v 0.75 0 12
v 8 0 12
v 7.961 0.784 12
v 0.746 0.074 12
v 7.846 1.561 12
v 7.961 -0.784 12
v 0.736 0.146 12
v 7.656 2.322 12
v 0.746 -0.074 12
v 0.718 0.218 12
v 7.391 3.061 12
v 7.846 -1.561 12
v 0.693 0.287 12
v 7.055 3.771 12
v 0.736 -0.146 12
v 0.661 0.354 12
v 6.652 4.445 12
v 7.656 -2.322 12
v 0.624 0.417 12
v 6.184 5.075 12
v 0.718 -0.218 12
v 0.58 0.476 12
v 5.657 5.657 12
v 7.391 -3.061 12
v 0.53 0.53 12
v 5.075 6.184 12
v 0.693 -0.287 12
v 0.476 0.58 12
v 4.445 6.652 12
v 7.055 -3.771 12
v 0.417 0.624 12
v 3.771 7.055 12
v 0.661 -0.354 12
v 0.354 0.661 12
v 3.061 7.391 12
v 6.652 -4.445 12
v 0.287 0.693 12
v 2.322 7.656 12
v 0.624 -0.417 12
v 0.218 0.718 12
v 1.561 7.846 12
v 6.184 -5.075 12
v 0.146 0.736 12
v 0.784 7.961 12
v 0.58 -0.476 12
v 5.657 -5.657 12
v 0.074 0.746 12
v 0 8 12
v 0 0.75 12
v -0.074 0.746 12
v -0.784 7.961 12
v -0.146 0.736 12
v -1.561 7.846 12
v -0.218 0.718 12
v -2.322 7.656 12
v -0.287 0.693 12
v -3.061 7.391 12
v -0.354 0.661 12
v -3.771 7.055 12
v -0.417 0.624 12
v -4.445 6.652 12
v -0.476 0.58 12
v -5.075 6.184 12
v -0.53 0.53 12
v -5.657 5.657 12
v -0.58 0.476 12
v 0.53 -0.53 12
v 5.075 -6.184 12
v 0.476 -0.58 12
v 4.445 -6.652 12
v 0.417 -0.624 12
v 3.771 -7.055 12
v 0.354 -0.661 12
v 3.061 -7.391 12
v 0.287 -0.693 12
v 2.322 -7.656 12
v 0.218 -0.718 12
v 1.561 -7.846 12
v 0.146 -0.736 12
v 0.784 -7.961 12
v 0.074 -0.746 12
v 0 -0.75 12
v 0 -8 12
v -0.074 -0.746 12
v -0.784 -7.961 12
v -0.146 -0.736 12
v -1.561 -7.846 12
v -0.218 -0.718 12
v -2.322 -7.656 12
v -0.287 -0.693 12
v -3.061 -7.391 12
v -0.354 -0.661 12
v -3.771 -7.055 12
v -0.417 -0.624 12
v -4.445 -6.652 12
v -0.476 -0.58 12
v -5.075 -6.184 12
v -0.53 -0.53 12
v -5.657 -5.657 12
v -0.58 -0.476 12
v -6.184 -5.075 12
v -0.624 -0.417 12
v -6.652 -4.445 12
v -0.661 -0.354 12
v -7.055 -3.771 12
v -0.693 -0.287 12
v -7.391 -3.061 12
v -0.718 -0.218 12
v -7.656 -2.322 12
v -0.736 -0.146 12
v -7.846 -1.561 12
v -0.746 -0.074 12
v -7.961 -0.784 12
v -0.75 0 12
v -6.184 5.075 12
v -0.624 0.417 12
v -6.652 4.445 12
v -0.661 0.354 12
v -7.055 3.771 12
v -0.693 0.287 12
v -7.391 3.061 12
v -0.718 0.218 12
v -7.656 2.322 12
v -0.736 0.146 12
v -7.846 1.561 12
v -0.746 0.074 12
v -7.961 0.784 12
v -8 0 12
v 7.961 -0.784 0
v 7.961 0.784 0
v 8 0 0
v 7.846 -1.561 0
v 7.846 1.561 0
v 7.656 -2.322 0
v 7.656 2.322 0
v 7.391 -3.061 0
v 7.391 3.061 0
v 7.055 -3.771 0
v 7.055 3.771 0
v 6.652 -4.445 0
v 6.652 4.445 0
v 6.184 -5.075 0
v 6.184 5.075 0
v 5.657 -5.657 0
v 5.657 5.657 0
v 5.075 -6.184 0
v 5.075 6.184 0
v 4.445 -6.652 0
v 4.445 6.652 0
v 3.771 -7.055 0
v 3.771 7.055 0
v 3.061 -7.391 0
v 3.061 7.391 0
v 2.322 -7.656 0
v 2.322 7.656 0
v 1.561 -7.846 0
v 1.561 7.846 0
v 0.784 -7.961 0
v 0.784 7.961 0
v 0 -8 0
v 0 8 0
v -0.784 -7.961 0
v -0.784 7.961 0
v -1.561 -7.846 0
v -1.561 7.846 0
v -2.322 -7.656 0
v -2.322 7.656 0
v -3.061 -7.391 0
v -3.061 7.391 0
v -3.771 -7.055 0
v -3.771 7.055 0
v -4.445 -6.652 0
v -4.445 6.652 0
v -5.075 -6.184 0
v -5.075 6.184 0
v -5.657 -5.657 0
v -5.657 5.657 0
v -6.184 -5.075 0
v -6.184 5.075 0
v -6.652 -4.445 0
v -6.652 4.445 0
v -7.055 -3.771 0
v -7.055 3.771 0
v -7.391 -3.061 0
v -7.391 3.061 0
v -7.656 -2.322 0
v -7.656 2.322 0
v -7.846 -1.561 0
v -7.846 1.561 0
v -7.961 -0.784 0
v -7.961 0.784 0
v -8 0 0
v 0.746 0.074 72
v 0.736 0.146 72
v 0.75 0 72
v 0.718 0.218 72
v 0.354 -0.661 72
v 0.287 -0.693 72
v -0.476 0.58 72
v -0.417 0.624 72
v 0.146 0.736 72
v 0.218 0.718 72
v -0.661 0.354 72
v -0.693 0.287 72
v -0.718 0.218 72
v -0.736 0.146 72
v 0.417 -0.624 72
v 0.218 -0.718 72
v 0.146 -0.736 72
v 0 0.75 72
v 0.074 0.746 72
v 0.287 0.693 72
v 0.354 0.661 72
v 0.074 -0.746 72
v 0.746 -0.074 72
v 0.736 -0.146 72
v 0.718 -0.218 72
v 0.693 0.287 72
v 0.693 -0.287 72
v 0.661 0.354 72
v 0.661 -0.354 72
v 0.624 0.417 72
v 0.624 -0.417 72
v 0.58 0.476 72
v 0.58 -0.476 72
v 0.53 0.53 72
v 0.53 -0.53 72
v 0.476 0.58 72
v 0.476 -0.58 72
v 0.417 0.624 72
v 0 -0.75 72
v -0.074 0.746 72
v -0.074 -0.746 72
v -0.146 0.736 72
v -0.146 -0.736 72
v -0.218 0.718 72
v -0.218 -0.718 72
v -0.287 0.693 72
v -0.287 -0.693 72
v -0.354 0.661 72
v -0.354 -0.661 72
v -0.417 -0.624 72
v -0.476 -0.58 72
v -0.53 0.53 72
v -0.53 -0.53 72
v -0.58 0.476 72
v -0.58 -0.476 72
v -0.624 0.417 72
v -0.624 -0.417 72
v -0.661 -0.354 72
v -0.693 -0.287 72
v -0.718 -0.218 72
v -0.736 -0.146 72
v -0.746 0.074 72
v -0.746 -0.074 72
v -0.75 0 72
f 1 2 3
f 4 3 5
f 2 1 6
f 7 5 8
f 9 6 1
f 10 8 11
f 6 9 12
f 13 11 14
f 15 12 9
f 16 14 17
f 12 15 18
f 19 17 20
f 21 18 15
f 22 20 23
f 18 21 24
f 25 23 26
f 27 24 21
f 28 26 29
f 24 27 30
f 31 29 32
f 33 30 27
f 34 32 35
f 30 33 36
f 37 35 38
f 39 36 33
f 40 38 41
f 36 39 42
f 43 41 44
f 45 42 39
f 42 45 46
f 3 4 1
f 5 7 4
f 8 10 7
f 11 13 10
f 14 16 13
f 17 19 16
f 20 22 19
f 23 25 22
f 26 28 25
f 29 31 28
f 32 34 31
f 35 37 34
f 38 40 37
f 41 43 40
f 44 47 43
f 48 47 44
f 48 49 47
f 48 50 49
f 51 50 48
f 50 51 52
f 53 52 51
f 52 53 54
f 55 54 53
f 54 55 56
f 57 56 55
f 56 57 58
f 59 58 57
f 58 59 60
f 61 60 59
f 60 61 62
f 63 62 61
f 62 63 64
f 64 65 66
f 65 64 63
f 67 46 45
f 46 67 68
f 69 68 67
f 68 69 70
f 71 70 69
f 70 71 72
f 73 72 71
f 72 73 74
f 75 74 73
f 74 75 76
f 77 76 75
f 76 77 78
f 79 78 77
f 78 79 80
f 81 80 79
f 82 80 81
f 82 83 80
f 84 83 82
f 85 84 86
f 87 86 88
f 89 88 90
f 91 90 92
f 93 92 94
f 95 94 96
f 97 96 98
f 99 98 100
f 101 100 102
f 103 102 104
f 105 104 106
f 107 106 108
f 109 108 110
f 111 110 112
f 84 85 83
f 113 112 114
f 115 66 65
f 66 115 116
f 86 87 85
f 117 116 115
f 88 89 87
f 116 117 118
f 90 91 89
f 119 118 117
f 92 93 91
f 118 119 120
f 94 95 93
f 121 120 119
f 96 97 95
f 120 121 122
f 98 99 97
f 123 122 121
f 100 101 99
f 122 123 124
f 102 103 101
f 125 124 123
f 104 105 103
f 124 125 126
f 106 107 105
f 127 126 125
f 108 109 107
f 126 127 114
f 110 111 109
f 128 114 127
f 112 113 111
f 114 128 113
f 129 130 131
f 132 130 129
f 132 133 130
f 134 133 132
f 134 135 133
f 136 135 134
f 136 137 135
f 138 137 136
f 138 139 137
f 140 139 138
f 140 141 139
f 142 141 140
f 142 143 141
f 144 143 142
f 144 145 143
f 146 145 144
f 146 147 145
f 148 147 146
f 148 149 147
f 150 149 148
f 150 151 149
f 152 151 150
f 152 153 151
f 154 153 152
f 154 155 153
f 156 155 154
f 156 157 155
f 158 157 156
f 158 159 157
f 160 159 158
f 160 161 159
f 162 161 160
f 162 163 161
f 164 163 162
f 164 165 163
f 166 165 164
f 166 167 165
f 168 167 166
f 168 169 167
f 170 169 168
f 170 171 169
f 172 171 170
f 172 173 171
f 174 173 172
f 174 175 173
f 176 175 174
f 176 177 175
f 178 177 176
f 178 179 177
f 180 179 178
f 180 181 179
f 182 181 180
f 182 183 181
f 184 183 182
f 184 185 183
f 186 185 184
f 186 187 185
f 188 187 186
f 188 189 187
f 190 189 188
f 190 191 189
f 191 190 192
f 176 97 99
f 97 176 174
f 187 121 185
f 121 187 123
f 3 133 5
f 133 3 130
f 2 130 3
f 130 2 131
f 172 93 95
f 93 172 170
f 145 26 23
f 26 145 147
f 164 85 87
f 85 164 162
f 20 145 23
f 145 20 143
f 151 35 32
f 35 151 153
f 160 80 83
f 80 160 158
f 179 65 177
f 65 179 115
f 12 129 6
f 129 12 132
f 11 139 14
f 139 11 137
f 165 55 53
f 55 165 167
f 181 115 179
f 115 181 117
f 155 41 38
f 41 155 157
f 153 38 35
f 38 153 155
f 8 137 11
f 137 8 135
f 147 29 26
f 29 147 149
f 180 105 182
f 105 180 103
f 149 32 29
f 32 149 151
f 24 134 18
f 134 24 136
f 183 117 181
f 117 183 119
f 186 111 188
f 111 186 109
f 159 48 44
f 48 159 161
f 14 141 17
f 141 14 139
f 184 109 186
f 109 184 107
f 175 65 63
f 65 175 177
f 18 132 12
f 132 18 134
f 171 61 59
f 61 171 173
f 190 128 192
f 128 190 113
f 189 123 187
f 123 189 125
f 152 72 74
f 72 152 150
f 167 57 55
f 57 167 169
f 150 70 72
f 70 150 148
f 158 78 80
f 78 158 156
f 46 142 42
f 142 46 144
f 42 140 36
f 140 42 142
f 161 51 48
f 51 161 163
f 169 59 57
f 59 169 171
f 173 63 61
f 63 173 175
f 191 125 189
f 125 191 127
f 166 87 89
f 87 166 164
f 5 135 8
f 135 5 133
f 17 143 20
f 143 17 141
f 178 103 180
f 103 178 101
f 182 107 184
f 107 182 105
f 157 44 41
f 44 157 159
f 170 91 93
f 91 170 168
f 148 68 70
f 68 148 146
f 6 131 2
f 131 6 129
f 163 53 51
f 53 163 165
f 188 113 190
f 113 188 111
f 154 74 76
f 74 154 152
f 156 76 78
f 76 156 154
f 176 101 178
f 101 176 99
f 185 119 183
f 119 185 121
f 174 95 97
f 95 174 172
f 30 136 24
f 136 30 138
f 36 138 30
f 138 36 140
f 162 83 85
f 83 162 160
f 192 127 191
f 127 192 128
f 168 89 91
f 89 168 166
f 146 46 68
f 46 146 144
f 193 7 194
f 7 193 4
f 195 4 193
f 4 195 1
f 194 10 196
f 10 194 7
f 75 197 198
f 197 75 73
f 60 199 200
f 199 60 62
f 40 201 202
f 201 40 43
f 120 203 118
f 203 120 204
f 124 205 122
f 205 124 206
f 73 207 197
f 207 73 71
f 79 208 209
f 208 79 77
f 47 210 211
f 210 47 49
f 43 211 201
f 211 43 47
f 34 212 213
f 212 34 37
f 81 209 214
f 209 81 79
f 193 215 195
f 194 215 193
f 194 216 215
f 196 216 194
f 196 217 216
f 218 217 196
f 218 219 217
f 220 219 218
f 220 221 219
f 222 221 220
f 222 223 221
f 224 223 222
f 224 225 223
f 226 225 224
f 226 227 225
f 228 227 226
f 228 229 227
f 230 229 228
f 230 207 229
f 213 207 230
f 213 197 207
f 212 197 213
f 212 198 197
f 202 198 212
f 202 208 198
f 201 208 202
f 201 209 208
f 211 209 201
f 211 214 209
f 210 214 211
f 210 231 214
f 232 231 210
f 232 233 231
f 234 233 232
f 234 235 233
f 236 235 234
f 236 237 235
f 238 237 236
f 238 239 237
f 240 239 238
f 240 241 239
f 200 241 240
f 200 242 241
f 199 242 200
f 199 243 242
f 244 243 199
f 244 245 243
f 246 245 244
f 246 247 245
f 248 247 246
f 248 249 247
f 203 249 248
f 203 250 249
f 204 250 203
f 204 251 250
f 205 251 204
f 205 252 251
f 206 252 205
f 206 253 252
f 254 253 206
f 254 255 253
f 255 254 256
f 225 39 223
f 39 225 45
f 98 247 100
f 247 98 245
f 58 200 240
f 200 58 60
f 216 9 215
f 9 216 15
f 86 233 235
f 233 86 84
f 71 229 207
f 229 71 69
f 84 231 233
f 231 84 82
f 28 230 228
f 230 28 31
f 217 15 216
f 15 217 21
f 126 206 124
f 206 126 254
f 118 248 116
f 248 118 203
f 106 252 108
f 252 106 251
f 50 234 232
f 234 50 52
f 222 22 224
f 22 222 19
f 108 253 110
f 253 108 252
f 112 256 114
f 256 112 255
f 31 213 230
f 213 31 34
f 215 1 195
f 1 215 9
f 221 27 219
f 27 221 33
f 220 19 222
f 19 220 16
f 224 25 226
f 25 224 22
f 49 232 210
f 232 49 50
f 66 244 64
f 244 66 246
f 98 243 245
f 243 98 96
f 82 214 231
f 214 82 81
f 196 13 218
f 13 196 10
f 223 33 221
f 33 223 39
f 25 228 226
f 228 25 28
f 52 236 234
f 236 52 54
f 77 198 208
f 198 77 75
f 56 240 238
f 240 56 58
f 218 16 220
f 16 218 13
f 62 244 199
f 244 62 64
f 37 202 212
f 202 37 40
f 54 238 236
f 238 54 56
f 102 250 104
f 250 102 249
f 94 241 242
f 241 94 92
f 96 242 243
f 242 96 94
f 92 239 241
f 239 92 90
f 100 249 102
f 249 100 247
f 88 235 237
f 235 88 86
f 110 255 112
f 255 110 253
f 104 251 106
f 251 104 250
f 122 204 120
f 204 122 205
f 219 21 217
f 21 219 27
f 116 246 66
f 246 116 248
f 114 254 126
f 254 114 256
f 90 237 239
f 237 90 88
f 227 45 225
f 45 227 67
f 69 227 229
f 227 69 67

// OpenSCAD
// Carpet / Material-Recognition Sensor — HTW HT-300PLTR1612-1-class 300 kHz
// ultrasonic transducer (OOMWOO BOM "Carpet sensor — Ultrasonic 300kHz")
// ===========================================================================
//
// Parametric clearance/interfacing model of the 300 kHz ultrasonic transducer
// used by OOMWOO as the carpet/material-recognition sensor.
//
// BOM identity (verify against the actual unit before relying on fit):
//   BOM.md row "Carpet sensor | 1 | $6-12 | Ultrasonic 300kHz | Low
//   availability retail ... purchase factory direct instead". The BOM does not
//   name a part number; the class of part is a ~300 kHz ultrasonic material /
//   carpet recognition transducer with a single enclosed transceiver element.
//
// Dimension basis — TWO independently fetched primary sources (2026-08-11):
//
//   S1: HTW (Chengdu Huitong West-Electronic) HT-300PLTR1612-1 product listing,
//       Made-in-China.com. Spec table verbatim:
//         "Diameter | mm | 16"
//         "Height  | mm | 12"
//         "Working mode | -- | Transceiver"
//         "Nominal frequency | KHz | 290±15"
//         "Directivity | Deg | ≤12°"
//         "Capacitance | pF | 1300±20%"
//         "Target distance | mm | 30"
//         "Precision | mm | ≤2mm"
//         "Housing | / | PC"
//       Product attributes: "Specification: diameter-16mm wire-60mm",
//       "Probe type: Dual Probe", "IP67", "RoHS".
//       URL: https://htwsensor.en.made-in-china.com/product/xfUrtLydvQhb/
//       ...-Ultraosinc-Sensor-Transducer.html  (fetched 2026-08-11)
//       Price US$6.00 @20-199 pcs — matches BOM $6-12.
//
//   S2: ISSRSensor ISUB30-16GK12 300 kHz ultrasonic material sensor,
//       issrsensor.com product page + selection manual naming grid:
//         - ISSR naming grid decodes "ISUB30-16GK12" as:
//           IS=ISSR, U=Ultrasonic, B=Basic, 30=30mm range,
//           16="Tube diameter 16mm", GK="Plastic shell", 12="Shell length 12mm"
//           -> body Ø16 × L12, matching S1.
//         - Spec table verbatim: "Detection Range | 30 ± 1 mm",
//           "Beam Angle | ±5°", "Sensor Frequency | Approx. 300 kHz",
//           "Operating Voltage | 5 V DC, ripple ≤ 10% Vpp",
//           "No-Load Current | ≤ 11 mA", "Ingress Protection Rating | IP65",
//           "Connection Type | VC connector, 1.25 mm pitch terminal,
//           A1251H-4P/CJT".
//       URL: https://issrsensor.com/products/ultrasonic-material-sensor-
//       300khz-robotic-vacuum/  (fetched 2026-08-11)
//
//   The two vendors describe the SAME class of part (300 kHz ultrasonic floor
//   material recognition transducer, Ø16 × 12mm). Treat the body envelope
//   (Ø16 × 12) as datasheet-confirmed; everything else marked (estimate) must
//   be caliper-verified against the physical unit (MEASURE-ME.md §16).
//
// Cross-axis convention: body axis along Z, sensing face pointing DOWN (−Z),
// wire exiting the TOP (+Z). Origin at body axis at the sensing face plane.
//
// STATUS: DRAFT — datasheet-grounded envelope, caliper verification required.
//
// License: CC BY-SA 4.0

$fn = 64;

/* [Dimensions — EDIT TO MATCH YOUR MEASURED PART] */

// --- Body envelope ---
body_dia = 16.0;   // (datasheet: HTW spec "Diameter | mm | 16"; ISSR naming
                   //  decode "16 = Tube diameter 16mm")
body_h   = 12.0;   // (datasheet: HTW spec "Height | mm | 12"; ISSR naming
                   //  decode "12 = Shell length 12mm")

// --- Sensing face (bottom, −Z) ---
// The emitting surface sits recessed inside a plastic housing; the exact
// recess depth / active aperture are not published.
face_recess   = 2.0;   // (estimate) recess of active element below face plane
active_dia    = 12.0;  // (estimate) active element aperture Ø (smaller than body)
face_dome_t   = 0.8;   // (estimate) plastic dome thickness over element

// --- Wire / cable exit (top, +Z) ---
wire_dia  = 1.5;   // (estimate) wire Ø (unpublished; typical for this class)
wire_len  = 60.0;  // (datasheet: HTW attributes "wire-60mm")
// ISSR variant uses a 1.25mm-pitch VC connector (A1251H-4P/CJT) instead of a
// bare wire — see MEASURE-ME §16 row 9 to confirm which termination you have.

// --- Mounting / retention ---
// No mounting flange is published for either source. These transducers are
// normally retained by a rubber grommet / interference fit into an Ø16-ish
// bore, or adhered. Modeled as plain cylinder; the fit jig
// (jigs-new/carpet-sensor-fit.scad) tests bore retention.
bore_clearance = 0.6;   // (estimate) diametral clearance in the printed mount
retain_collar_h = 3.0;  // (estimate) height of interference band used in jig

// ===== MODULES =====

module transducer_body() {
    color("#3a3a3a", 0.9) {
        translate([0, 0, 0])
            cylinder(d = body_dia, h = body_h);
    }
}

module sensing_face() {
    // Recessed active element + plastic dome at the −Z face.
    // Active element (cavity):
    color("#222222") {
        translate([0, 0, face_recess])
            cylinder(d = active_dia, h = body_h - face_recess);
    }
    // Dome over the element (thin plastic disc flush with body):
    color("#dddddd", 0.85) {
        translate([0, 0, 0])
            cylinder(d = active_dia, h = face_dome_t);
    }
}

module wire_lead() {
    // Cable exiting the top face (+Z), centered on axis. Marked (estimate)
    // for the Ø/slack; length per HTW "wire-60mm".
    color("#cc2222", 0.9) {
        translate([0, 0, body_h])
            cylinder(d = wire_dia, h = wire_len);
    }
}

module rough_mount_band() {
    // Visual-only interference band (no geometry): retained by grommet at the
    // collar height region. Drawn as a thin raised rib on the upper body.
    color("#666666") {
        translate([0, 0, body_h - retain_collar_h])
            difference() {
                cylinder(d = body_dia + 0.4, h = 1.0);
                cylinder(d = body_dia - 0.4, h = 1.1);
            }
    }
}

// ===== ASSEMBLY =====
transducer_body();
sensing_face();
wire_lead();
// rough_mount_band();  // uncomment if you want the visual retention rib

// ===== NOTES =====
// - If you buy the HT-300PLT-A / -M / -MIR variants (with embedded PCBA), a
//   PCB/daughterboard extends the envelope beyond this bare-transducer
//   cylinder — measure it and add a module below (MEASURE-ME §16 rows 10-11).
// - The ISSR ISUB30-16GK12 uses a 1.25mm-pitch VC plug (A1251H-4P/CJT) rather
//   than this model's bare wire — confirm termination before committing a
//   wire-routing channel in the chassis.
